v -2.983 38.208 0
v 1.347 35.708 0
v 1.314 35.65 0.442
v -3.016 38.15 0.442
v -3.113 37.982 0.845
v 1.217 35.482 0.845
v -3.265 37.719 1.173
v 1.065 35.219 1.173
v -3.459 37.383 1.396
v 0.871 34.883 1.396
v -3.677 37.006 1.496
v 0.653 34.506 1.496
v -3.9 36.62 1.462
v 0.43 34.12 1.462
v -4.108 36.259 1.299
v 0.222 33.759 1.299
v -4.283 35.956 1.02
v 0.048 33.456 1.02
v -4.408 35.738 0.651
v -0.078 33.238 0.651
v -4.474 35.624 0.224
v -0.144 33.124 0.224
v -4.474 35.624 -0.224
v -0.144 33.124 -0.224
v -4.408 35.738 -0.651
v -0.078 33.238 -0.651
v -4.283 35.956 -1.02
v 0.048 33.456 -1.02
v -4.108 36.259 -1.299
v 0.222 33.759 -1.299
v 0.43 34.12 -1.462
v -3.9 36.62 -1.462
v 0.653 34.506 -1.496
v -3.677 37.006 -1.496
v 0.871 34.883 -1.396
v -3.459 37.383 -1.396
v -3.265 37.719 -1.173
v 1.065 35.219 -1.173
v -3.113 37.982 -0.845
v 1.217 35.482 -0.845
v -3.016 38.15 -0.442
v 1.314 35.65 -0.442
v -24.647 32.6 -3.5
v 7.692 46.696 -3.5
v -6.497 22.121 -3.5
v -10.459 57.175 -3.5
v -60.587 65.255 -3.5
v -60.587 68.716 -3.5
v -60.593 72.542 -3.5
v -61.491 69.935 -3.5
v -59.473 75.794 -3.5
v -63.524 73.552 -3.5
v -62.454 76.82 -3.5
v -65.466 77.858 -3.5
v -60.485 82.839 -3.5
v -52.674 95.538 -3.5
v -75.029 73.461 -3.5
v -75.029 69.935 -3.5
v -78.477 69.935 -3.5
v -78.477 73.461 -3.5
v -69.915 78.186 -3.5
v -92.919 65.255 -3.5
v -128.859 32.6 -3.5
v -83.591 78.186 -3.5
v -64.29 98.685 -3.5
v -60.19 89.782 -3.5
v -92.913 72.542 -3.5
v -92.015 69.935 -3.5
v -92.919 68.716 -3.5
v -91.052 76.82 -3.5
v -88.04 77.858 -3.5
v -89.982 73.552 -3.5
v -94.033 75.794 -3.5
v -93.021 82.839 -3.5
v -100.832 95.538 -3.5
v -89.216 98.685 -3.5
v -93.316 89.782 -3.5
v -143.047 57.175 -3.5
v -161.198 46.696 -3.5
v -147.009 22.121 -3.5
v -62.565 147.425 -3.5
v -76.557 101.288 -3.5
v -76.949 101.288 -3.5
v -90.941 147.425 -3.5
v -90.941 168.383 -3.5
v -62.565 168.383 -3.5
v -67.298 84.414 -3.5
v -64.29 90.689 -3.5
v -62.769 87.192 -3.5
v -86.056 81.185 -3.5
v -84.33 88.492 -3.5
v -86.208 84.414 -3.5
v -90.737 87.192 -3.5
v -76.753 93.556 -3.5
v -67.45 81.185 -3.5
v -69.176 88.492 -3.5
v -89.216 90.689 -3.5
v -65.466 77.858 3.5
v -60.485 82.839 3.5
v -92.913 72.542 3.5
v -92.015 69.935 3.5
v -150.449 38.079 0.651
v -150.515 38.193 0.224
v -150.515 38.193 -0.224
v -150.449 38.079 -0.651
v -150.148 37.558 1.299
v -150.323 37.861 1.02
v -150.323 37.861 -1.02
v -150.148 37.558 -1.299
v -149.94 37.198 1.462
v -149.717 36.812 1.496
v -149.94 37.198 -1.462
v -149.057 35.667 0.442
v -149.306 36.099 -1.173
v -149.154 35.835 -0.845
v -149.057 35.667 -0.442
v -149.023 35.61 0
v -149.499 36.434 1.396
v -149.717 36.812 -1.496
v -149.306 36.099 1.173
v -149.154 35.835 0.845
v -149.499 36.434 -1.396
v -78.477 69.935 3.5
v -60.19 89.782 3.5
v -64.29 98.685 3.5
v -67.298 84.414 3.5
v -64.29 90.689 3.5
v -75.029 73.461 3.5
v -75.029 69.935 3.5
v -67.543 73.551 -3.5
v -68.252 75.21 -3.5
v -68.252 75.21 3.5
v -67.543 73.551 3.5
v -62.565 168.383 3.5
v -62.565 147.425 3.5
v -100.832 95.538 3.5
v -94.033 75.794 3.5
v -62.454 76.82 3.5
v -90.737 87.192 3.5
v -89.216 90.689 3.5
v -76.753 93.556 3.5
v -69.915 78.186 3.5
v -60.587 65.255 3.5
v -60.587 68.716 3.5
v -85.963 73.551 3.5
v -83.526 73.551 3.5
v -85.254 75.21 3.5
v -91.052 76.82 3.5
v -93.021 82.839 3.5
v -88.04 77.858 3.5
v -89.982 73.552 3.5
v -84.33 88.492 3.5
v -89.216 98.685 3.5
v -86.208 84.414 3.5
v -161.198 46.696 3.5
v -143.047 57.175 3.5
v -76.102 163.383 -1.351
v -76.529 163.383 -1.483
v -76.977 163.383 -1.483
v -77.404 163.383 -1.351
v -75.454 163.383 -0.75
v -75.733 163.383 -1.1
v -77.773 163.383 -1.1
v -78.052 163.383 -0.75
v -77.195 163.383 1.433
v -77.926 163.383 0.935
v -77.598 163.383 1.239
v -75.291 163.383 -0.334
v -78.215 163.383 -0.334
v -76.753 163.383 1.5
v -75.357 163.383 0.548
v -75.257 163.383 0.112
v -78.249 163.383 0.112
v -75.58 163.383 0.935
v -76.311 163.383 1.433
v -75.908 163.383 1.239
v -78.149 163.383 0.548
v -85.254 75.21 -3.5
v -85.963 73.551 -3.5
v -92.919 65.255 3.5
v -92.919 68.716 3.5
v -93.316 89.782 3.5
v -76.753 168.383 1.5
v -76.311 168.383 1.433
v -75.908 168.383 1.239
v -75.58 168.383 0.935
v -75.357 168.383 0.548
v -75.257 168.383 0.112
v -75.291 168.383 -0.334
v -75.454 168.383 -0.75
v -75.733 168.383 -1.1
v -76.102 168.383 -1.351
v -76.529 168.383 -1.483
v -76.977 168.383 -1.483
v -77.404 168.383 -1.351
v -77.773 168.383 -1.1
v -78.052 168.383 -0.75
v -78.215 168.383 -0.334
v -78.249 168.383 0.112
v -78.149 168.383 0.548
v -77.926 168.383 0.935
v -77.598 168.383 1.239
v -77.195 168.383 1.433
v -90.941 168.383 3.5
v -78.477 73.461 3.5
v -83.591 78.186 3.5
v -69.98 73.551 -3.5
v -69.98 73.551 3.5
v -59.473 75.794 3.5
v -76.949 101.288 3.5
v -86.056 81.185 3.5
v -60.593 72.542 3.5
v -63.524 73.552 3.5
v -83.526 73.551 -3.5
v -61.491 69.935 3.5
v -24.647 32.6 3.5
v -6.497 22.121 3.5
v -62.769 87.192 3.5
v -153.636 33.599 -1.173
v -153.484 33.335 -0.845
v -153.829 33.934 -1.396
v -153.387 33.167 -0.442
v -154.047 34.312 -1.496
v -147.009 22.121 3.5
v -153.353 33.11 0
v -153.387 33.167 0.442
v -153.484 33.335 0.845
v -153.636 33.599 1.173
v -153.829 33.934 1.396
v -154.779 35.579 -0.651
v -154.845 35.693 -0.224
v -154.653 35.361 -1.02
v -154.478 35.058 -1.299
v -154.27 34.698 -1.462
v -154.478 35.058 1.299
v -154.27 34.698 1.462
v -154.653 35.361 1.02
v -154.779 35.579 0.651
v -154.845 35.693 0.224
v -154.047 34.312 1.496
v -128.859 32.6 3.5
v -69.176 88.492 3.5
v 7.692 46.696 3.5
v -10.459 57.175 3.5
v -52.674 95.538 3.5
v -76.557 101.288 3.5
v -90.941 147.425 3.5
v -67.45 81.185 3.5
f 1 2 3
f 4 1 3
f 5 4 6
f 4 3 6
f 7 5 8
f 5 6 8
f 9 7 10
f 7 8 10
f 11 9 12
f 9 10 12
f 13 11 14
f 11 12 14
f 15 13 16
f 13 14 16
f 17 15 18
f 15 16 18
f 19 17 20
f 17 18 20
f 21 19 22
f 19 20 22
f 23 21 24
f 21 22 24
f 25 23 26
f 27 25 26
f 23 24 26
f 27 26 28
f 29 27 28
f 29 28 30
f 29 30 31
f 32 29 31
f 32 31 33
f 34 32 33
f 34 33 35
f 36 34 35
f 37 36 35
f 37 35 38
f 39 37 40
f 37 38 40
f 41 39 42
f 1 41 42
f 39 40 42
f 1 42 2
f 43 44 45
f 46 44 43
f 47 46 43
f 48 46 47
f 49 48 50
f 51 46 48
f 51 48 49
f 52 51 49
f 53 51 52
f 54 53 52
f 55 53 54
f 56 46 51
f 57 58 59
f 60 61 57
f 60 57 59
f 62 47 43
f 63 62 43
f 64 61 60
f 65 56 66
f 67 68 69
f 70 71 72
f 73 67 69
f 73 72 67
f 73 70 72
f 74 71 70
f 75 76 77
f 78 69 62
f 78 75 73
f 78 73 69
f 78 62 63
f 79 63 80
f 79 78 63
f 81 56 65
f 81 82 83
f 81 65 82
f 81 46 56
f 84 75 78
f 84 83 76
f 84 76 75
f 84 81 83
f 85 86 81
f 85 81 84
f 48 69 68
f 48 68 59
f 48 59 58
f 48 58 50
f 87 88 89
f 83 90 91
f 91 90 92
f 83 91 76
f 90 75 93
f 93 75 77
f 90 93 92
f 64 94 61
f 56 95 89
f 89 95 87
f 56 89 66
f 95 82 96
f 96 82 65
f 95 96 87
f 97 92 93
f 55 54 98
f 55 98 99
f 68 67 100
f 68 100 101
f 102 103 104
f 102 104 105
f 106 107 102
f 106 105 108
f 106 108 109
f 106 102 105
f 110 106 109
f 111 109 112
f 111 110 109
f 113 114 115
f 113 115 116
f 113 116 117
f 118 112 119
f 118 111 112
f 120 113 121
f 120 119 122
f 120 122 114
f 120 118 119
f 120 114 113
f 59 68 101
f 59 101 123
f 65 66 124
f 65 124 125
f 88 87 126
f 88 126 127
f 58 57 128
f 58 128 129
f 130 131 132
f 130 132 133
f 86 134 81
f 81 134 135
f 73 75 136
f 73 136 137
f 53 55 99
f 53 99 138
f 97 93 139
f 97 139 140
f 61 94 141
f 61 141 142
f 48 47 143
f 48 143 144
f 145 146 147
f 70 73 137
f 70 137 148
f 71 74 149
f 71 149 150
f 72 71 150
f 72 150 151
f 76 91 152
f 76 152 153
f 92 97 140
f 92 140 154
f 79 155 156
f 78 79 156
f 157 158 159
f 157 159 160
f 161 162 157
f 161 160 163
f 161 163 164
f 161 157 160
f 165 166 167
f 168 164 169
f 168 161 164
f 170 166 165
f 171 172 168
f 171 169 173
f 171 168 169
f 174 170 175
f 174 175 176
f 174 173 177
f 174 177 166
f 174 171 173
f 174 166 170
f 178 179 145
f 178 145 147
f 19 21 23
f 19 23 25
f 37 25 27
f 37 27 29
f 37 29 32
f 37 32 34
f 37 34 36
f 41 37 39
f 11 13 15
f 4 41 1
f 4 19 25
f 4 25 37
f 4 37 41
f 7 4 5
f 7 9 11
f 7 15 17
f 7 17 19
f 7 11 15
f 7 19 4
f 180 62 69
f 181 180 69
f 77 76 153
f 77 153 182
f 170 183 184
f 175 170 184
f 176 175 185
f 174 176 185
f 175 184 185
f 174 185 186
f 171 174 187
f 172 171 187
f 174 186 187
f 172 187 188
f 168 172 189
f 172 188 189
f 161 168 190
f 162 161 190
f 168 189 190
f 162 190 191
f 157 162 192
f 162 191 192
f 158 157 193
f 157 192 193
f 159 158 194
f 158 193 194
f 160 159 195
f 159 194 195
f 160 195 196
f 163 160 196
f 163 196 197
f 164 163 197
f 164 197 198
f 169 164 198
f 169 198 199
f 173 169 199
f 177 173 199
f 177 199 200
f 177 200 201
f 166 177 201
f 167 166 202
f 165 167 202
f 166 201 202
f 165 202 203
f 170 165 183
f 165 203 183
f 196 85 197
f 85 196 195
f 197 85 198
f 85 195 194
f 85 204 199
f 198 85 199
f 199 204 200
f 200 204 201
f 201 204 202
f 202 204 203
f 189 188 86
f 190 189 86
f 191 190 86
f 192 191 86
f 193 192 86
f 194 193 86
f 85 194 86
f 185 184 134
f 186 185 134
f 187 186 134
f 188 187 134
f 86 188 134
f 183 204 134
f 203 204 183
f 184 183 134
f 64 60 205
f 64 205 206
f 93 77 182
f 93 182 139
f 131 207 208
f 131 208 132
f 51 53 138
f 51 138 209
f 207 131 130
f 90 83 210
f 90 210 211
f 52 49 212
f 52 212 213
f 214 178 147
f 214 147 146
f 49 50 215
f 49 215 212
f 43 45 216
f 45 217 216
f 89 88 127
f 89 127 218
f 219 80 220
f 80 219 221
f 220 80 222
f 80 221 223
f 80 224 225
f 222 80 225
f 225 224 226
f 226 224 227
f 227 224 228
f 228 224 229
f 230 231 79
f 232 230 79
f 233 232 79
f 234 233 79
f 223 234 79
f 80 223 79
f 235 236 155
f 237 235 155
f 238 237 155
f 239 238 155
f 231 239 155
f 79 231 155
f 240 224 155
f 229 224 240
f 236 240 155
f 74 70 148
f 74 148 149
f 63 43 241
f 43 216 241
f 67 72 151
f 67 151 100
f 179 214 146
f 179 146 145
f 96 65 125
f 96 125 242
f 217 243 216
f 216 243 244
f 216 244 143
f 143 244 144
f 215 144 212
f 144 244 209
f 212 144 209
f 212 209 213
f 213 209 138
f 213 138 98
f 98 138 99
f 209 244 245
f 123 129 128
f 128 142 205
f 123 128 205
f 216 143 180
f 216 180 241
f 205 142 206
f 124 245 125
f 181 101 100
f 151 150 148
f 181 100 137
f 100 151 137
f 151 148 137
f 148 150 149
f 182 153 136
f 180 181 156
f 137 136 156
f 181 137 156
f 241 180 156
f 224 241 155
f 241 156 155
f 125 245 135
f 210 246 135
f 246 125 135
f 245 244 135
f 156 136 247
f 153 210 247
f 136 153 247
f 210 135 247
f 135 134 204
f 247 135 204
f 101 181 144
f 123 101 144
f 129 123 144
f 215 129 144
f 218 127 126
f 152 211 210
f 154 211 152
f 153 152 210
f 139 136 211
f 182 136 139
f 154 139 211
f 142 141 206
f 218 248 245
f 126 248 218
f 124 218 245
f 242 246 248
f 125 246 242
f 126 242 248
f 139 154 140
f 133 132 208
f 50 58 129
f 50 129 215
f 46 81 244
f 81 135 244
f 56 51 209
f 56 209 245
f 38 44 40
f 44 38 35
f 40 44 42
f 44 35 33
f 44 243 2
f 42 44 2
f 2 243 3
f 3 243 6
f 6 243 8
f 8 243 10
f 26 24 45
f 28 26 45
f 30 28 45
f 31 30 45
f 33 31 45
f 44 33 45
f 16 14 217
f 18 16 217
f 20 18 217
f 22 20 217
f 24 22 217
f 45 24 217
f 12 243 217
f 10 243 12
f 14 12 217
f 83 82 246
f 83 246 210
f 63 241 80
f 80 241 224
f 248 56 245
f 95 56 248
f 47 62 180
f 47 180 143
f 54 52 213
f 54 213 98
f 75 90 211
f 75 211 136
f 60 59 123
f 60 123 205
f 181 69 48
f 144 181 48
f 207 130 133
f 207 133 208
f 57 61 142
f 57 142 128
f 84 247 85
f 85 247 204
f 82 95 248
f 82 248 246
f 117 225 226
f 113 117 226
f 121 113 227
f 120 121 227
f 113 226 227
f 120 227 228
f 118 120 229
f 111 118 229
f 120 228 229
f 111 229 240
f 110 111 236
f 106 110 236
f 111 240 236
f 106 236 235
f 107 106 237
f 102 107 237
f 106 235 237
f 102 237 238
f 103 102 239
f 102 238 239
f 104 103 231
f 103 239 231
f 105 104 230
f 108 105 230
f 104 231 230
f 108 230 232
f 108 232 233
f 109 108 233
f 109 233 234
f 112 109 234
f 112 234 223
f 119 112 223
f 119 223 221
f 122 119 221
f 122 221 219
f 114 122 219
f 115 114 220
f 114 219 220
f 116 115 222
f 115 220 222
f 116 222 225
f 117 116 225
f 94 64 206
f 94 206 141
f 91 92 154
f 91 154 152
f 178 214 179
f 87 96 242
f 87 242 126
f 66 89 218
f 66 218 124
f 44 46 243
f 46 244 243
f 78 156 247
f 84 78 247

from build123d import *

# Parameters (mm, degrees)
BOSS_EXTRUDE1_DEPTH    = 3.5
SKETCH7_R              = 1.5
CUT_EXTRUDE2_DEPTH     = 5
SKETCH8_R              = 1.5
CUT_EXTRUDE3_DEPTH     = 5
CIRPATTERN2_COUNT      = 3
SKETCH10_R             = 1.5
CUT_EXTRUDE4_DEPTH     = 5
CUT_EXTRUDE6_START     = -3.5
CUT_EXTRUDE6_OUTLINE_W = 32.331955976
CUT_EXTRUDE6_OUTLINE_H = 3.460853055
CUT_EXTRUDE6_DEPTH     = 7


# Read off the part's stored shape, not the designer's step: Cut-Extrude6
with BuildPart() as part:
    # Sketch5 → Boss-Extrude1 (new, symmetric)
    with BuildSketch(Plane.XY):
        Polygon((-90.941420321, 147.425432766), (-90.941420321, 168.383482689), (-62.564539335, 168.383482689), (-62.564539335, 147.425432766), (-10.458602513, 57.175302815), (7.691601133, 46.696277854), (-6.49683936, 22.12117804), (-24.647043006, 32.600203001), (-128.85891665, 32.600203001), (-147.009120296, 22.12117804), (-161.197560789, 46.696277854), (-143.047357143, 57.175302815), align=None)
    extrude(amount=BOSS_EXTRUDE1_DEPTH, both=True)

    # Sketch7 → Cut-Extrude2 (cut)
    with BuildSketch(Plane(origin=(-14.451380592, 8.343508475, 0), x_dir=(0, 0, -1), z_dir=(0.8660254037844364, -0.5000000000000041, 0))):
        with Locations(Location((0, 30.097522957, 0), (0, 0, 90))):
            Circle(SKETCH7_R)
    extrude(amount=-CUT_EXTRUDE2_DEPTH, mode=Mode.SUBTRACT)

    # Sketch8 → Cut-Extrude3 (cut)
    with BuildSketch(Plane(origin=(-100.67808915, -58.126521872, 0), x_dir=(0, 0, 1), z_dir=(-0.8660254037844431, -0.49999999999999245, 0))):
        with Locations(Location((0, 106.850502785, 0), (0, 0, 270))):
            Circle(SKETCH8_R)
    cut_extrude3 = extrude(amount=-CUT_EXTRUDE3_DEPTH, mode=Mode.SUBTRACT)

    # CirPattern2: Cut-Extrude3 ×3 about axis
    cirpattern2_axis = Axis((-73.590173973, 82.29390331, -173.325842425), (0, 0, 1))
    for i in range(1, CIRPATTERN2_COUNT):
        add(cut_extrude3.rotate(cirpattern2_axis, i * 360 / CIRPATTERN2_COUNT), mode=Mode.SUBTRACT)

    # Sketch10 → Cut-Extrude4 (cut)
    with BuildSketch(Plane(origin=(0, 168.383482689, 0), x_dir=(1, 0, 0), z_dir=(0, 1, 0))):
        with Locations(Location((-76.752979828, 0, 0), (0, 0, 270))):
            Circle(SKETCH10_R)
    extrude(amount=-CUT_EXTRUDE4_DEPTH, mode=Mode.SUBTRACT)

    # Cut-Extrude6 outline → Cut-Extrude6 (cut)
    # profile 1 of 4: a face of its own
    with BuildSketch(Plane.XY.offset(CUT_EXTRUDE6_START)):
        Polygon((-76.948691213, 101.287582971), (-86.056353801, 81.184584586), (-100.832316407, 95.538376831), (-94.032857208, 75.793793389), (-91.051568615, 76.820462308), (-93.021355851, 82.839256642), (-88.039745602, 77.857646392), (-89.981729258, 73.551508719), (-92.913050535, 72.542047087), (-92.015211095, 69.934859484), (-78.477180663, 69.934859484), (-78.477180663, 73.460729214), (-83.5906503, 78.186442564), (-76.752979828, 93.555750632), (-69.915309356, 78.186442564), (-75.028778993, 73.460729214), (-75.028778993, 69.934859484), (-61.490748561, 69.934859484), (-60.592909121, 72.542047087), (-63.524230398, 73.551508719), (-65.466214054, 77.857646392), (-60.484603805, 82.839256642), (-62.454391041, 76.820462308), (-59.473102448, 75.793793389), (-52.673643249, 95.538376831), (-67.449605855, 81.184584586), (-76.557268443, 101.287582971), align=None)
        Polygon((-83.525690609, 73.550911585), (-85.963086807, 73.550911585), (-85.254252198, 75.209756113), align=None, mode=Mode.SUBTRACT)
        Polygon((-68.251707458, 75.209756113), (-67.542872849, 73.550911585), (-69.980269047, 73.550911585), align=None, mode=Mode.SUBTRACT)
    # profile 2 of 4: a face of its own
    with BuildSketch(Plane.XY.offset(CUT_EXTRUDE6_START)):
        Polygon((-69.175827244, 88.491814683), (-67.297925544, 84.413543316), (-64.289758699, 90.689055224), (-62.769327814, 87.191919697), (-60.190430004, 89.782344087), (-64.289758699, 98.684926605), align=None)
    # profile 3 of 4: a face of its own
    with BuildSketch(Plane.XY.offset(CUT_EXTRUDE6_START)):
        with Locations((-76.752979828, 66.985702835)):
            Rectangle(CUT_EXTRUDE6_OUTLINE_W, CUT_EXTRUDE6_OUTLINE_H)
    # profile 4 of 4: a face of its own
    with BuildSketch(Plane.XY.offset(CUT_EXTRUDE6_START)):
        Polygon((-93.315529652, 89.782344087), (-90.736631842, 87.191919697), (-89.216200957, 90.689055224), (-86.208034112, 84.413543316), (-84.330132412, 88.491814683), (-89.216200957, 98.684926605), align=None)
    extrude(amount=CUT_EXTRUDE6_DEPTH, mode=Mode.SUBTRACT)


solid = part.part
